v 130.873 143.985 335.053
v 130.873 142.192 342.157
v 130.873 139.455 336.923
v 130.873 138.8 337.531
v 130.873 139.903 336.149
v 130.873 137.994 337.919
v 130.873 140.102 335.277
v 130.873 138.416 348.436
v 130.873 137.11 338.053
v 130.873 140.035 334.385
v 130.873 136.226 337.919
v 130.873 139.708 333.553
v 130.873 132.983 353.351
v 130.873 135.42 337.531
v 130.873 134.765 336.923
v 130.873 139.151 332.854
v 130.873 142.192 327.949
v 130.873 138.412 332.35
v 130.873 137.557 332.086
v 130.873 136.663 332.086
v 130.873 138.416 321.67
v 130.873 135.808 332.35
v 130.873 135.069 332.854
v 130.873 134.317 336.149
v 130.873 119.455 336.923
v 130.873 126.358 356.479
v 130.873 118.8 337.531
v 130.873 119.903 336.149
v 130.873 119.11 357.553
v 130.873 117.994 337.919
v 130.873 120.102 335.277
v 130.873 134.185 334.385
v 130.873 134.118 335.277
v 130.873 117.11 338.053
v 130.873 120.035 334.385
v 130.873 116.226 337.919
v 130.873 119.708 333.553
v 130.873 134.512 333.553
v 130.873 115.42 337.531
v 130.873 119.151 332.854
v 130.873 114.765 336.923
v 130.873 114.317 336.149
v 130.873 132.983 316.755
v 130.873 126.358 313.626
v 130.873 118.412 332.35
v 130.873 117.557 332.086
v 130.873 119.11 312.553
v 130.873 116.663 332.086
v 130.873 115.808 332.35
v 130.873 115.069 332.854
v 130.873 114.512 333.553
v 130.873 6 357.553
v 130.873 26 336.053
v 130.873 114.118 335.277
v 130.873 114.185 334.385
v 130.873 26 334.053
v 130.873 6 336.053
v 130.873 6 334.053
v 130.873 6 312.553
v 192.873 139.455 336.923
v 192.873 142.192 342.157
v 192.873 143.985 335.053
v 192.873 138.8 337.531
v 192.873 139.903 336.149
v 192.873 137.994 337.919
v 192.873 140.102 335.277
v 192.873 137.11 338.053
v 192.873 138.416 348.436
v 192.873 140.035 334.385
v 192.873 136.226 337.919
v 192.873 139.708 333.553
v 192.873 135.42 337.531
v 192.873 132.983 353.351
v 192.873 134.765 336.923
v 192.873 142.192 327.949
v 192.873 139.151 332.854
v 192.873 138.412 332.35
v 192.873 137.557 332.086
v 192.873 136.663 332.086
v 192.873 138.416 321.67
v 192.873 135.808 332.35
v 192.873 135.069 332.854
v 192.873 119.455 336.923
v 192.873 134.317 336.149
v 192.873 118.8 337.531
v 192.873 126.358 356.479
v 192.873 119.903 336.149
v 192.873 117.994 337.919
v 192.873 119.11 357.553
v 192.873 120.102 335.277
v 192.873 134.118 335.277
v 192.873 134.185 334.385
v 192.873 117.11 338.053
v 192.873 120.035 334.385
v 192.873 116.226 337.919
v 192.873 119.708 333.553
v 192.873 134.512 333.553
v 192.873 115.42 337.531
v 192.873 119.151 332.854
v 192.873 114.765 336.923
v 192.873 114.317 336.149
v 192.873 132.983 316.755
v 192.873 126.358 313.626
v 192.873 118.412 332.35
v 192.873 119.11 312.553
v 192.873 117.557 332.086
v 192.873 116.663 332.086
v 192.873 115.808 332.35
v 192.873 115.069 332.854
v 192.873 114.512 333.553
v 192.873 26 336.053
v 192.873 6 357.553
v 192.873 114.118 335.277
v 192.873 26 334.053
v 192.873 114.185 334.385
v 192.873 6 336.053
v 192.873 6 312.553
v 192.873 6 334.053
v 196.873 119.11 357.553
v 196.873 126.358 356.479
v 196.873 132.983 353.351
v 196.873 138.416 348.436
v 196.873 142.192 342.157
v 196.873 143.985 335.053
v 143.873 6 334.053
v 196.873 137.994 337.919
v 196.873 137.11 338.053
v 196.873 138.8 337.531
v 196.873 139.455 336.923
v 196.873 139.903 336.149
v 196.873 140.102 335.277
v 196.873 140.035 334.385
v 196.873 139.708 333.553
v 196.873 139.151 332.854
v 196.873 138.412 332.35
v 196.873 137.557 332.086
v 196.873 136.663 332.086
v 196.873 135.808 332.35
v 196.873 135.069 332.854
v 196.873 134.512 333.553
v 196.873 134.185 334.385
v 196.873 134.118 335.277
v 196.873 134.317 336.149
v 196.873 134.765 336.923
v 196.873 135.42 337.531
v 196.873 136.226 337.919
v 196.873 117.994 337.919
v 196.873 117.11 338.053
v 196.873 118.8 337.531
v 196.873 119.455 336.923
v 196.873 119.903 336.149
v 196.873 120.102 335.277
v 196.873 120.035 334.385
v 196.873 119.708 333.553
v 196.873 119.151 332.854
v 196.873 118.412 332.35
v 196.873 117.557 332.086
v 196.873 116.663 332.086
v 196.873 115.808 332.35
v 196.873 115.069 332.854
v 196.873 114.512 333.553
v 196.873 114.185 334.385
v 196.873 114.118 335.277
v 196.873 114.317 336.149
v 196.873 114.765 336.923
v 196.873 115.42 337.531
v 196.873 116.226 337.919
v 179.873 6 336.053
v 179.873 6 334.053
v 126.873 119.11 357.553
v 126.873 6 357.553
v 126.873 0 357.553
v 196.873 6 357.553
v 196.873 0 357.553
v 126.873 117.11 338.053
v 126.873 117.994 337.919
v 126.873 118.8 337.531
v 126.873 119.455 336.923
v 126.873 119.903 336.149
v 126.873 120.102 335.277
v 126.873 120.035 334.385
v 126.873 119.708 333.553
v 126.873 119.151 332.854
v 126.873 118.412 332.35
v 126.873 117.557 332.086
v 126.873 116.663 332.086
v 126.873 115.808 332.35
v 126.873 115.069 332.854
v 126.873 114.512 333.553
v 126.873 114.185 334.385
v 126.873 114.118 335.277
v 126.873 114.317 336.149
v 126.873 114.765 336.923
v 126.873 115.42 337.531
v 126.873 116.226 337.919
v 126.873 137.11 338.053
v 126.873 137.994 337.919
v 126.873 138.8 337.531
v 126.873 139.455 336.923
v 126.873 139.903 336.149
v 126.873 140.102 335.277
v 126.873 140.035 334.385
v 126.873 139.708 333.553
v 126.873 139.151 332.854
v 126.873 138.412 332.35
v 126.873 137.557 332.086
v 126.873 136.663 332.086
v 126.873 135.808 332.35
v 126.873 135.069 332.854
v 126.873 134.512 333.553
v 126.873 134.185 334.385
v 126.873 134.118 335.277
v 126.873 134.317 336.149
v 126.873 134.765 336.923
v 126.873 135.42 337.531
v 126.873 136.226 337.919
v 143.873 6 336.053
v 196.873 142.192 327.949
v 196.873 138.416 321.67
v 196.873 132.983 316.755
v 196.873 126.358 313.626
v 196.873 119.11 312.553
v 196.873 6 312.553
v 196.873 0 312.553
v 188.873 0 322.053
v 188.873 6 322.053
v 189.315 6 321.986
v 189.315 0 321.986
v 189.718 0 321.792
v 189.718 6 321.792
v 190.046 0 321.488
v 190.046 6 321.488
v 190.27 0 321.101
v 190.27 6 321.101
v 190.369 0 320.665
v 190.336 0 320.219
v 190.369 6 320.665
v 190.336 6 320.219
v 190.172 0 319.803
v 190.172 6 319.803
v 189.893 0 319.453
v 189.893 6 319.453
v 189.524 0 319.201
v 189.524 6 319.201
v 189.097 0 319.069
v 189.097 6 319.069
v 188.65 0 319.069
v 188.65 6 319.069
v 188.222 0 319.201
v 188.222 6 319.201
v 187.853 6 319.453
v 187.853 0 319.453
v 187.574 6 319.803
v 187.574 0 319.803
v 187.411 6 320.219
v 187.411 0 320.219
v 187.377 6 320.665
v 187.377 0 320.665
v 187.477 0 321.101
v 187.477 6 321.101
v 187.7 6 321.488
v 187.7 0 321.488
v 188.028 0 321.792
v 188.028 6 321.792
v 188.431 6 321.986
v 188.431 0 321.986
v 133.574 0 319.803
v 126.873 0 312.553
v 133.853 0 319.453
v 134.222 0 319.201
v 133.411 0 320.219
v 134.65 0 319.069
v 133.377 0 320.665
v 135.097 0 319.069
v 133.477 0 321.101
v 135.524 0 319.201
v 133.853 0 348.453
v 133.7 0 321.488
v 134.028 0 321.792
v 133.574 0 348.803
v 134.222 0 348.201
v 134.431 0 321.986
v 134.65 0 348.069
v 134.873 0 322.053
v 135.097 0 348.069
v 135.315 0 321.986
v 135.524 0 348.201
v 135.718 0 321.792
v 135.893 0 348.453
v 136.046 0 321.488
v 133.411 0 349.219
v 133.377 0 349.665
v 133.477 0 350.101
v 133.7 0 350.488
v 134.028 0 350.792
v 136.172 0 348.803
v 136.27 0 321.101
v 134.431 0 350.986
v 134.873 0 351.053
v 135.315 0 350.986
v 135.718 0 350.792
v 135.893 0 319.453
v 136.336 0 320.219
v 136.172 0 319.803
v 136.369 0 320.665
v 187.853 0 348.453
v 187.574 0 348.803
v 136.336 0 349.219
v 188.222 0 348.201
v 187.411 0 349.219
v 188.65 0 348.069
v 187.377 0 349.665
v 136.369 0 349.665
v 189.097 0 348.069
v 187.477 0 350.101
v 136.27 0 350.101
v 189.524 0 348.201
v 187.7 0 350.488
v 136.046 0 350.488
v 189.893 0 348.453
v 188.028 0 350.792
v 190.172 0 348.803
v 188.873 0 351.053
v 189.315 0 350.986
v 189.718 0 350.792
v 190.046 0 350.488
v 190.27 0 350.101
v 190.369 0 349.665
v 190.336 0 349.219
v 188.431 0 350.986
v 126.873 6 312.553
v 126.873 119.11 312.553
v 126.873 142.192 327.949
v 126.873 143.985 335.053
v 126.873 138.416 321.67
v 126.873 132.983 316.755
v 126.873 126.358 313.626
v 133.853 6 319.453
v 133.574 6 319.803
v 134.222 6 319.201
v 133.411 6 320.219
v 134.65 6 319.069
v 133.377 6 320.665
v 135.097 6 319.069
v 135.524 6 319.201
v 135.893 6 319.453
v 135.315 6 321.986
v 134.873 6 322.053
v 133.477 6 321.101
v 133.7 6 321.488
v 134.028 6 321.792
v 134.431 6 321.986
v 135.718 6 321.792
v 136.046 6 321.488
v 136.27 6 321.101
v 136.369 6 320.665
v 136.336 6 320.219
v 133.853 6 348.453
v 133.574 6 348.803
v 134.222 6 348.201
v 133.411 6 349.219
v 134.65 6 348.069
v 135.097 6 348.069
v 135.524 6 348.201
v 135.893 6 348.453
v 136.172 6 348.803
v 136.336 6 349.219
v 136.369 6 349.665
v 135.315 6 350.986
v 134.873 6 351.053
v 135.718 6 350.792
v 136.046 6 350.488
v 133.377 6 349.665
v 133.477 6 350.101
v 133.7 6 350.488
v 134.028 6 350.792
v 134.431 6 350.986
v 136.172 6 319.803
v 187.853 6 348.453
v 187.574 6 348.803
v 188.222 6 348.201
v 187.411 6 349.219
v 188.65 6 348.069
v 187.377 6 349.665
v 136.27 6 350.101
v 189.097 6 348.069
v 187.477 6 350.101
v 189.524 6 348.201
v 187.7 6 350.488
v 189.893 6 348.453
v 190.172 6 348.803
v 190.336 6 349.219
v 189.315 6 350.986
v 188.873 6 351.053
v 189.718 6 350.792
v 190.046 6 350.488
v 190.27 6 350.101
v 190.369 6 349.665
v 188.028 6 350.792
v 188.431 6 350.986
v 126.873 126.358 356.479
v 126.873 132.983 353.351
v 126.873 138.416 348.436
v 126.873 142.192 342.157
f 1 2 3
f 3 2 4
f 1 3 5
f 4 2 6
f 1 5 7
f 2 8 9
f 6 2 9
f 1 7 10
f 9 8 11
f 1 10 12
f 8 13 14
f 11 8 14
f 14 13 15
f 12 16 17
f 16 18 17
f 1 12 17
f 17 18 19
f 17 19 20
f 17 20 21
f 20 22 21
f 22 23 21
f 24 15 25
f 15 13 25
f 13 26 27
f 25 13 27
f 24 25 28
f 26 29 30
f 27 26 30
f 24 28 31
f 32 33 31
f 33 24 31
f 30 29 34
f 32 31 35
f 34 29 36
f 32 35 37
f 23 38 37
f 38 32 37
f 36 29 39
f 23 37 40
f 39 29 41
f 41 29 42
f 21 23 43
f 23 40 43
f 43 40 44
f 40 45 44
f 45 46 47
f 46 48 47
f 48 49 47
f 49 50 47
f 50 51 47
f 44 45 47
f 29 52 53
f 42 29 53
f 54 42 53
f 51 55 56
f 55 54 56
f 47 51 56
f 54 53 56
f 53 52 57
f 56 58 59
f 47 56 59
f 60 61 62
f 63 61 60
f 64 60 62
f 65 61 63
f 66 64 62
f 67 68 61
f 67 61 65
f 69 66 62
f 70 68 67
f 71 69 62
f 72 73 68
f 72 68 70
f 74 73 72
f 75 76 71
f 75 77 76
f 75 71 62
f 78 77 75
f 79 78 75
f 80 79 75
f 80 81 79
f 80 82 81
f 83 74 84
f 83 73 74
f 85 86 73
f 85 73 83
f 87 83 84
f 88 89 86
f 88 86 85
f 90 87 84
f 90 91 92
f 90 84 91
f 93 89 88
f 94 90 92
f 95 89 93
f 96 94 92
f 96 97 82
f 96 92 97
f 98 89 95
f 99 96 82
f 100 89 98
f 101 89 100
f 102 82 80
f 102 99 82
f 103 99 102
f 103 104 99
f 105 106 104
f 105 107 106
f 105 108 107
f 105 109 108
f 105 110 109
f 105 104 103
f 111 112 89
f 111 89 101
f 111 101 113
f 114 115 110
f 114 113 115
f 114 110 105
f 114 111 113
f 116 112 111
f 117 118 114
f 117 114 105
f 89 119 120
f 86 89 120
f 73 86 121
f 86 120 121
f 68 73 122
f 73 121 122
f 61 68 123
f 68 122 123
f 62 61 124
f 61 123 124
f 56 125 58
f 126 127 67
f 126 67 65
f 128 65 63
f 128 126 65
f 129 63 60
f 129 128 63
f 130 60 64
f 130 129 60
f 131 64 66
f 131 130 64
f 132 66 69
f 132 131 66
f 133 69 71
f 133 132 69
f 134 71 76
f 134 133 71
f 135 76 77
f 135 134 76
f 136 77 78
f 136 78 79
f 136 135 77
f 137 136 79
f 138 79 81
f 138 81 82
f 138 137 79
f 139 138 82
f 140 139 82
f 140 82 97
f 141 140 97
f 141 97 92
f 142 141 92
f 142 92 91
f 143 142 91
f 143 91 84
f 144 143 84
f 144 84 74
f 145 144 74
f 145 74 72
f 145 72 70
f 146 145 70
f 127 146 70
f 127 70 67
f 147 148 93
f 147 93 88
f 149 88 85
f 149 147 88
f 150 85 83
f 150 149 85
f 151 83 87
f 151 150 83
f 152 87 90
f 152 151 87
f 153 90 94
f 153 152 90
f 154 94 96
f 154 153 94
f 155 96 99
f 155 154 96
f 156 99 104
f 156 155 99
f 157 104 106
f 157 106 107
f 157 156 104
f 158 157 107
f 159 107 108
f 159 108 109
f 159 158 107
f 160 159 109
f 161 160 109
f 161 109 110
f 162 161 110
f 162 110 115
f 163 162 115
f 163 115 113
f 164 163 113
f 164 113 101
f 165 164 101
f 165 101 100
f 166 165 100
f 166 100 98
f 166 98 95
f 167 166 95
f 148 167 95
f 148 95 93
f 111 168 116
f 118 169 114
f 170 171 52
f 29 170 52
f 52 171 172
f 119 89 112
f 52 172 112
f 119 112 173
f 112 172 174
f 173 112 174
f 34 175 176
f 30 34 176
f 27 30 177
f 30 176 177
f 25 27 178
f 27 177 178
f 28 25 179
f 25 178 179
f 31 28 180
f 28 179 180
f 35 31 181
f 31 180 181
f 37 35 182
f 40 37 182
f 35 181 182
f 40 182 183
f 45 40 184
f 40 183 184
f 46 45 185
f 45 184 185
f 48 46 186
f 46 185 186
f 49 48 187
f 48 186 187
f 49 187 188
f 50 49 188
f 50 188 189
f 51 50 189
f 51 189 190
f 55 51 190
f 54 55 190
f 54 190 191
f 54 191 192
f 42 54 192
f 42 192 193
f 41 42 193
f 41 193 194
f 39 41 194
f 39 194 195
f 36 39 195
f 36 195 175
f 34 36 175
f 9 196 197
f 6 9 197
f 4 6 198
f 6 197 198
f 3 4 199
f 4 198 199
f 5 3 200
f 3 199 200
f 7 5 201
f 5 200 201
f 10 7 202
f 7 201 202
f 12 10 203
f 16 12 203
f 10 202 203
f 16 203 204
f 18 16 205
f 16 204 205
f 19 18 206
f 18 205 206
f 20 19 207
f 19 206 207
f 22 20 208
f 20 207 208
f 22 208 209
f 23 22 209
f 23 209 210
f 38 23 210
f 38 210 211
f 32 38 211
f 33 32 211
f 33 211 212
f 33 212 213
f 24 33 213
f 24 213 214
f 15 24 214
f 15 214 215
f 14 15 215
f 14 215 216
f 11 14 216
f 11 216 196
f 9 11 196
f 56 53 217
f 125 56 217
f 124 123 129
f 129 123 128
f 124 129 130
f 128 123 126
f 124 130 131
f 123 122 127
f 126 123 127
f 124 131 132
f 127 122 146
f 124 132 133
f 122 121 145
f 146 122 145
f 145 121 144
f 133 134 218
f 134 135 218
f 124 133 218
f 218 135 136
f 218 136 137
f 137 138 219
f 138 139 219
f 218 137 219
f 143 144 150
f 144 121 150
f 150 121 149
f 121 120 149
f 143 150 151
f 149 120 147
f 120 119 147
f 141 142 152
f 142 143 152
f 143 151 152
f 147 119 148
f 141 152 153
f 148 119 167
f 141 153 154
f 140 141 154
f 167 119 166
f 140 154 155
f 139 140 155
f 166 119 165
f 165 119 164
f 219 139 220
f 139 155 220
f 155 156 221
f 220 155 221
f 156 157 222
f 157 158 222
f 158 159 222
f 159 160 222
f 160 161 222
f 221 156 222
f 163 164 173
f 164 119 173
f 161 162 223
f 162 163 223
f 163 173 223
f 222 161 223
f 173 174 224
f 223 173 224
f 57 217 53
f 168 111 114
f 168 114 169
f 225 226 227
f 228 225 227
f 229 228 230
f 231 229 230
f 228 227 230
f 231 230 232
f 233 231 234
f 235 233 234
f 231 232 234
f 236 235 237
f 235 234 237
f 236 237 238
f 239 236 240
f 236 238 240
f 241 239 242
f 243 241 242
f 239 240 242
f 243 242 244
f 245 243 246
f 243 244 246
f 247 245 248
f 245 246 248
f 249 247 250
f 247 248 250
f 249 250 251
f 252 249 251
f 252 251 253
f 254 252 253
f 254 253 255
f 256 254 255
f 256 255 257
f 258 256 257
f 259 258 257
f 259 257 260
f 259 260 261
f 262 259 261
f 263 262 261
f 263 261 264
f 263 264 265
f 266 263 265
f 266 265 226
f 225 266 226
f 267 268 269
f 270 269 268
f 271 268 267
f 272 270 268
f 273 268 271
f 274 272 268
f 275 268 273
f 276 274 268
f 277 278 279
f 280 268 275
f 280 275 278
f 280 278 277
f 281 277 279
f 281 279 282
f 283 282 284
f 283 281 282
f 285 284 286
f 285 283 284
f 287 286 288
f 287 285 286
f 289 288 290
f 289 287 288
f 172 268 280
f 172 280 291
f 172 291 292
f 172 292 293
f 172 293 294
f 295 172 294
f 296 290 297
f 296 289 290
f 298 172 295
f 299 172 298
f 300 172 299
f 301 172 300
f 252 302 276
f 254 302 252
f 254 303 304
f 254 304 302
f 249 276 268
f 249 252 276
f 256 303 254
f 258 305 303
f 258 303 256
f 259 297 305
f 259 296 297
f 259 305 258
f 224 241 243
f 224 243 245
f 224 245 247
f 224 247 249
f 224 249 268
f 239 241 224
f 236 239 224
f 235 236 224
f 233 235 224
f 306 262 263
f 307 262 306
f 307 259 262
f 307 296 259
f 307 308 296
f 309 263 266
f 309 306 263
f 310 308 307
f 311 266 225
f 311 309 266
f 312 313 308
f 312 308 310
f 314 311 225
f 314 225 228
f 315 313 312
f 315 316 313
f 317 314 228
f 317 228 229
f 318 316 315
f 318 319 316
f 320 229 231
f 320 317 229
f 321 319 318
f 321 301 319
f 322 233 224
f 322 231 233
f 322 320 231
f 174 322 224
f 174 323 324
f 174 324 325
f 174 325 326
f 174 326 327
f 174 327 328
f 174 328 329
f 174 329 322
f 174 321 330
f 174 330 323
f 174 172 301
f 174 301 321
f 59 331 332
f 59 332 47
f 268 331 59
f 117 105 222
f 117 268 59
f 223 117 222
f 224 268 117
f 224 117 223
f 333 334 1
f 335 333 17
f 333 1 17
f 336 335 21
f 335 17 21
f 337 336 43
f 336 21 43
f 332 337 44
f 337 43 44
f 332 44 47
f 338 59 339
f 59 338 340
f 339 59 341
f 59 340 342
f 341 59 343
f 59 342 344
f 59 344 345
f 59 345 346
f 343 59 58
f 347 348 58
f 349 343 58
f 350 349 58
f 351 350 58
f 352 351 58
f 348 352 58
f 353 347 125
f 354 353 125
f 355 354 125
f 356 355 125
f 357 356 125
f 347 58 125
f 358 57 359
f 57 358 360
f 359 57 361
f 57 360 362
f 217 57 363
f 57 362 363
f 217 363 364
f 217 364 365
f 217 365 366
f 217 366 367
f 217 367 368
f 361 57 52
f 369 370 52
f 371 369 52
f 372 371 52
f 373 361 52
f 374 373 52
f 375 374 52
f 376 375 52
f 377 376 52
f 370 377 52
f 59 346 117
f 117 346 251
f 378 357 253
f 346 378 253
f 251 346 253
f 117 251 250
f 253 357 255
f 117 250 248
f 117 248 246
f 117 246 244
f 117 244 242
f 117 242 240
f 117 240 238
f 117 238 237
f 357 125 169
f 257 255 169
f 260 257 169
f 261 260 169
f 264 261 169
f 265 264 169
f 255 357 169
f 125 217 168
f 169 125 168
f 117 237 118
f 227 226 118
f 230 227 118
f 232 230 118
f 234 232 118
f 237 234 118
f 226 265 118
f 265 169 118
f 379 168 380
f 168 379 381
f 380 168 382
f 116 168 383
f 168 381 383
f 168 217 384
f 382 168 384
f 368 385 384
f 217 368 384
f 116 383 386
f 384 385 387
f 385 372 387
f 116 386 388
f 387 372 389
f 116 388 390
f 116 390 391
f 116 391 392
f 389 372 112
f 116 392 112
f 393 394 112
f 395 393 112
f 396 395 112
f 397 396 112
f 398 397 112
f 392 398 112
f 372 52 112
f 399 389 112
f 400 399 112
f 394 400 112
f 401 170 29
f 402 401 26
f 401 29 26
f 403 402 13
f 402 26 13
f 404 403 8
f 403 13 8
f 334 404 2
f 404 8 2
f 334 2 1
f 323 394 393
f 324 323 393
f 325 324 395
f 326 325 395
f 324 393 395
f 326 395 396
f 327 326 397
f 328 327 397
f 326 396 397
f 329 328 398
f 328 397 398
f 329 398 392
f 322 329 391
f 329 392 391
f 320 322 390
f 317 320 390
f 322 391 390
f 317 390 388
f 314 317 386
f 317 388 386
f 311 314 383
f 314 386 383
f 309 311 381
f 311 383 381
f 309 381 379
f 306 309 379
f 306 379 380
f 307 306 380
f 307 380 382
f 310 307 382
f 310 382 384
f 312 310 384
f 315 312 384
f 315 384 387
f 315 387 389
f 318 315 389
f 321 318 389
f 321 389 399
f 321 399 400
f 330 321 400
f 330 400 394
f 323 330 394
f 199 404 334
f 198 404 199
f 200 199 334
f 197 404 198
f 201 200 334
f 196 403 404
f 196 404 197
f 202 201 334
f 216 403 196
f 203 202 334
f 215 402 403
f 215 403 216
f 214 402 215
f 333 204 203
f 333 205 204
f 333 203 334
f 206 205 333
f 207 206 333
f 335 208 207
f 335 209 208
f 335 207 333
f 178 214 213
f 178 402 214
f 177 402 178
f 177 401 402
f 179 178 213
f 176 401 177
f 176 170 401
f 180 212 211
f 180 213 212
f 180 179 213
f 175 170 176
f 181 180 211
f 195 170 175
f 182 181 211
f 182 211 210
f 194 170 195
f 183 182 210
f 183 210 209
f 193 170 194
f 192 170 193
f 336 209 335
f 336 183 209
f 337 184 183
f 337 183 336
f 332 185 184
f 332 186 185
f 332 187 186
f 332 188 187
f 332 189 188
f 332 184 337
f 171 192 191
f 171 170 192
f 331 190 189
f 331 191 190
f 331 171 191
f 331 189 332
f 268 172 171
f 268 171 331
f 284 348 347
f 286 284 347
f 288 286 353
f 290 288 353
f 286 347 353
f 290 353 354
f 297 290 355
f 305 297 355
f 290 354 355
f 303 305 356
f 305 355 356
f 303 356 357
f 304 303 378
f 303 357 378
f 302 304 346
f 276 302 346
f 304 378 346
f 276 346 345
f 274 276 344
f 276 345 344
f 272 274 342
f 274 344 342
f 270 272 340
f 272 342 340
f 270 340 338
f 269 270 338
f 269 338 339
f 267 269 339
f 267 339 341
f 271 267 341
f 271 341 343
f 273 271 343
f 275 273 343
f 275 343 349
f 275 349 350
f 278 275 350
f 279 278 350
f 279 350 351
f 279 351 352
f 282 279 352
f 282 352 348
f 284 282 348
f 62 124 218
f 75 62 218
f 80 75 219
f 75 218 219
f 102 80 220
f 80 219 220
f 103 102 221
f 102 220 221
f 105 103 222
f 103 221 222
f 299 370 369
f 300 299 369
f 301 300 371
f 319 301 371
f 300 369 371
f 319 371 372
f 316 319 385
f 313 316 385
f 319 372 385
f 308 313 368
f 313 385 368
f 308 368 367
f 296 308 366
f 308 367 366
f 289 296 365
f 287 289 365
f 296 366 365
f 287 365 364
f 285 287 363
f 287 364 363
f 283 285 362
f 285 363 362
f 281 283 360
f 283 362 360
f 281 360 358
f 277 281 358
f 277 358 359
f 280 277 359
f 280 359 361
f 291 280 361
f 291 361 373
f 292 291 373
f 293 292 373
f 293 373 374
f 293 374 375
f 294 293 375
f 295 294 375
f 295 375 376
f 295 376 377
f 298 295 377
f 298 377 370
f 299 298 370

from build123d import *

# Parameters (mm, degrees)
SKETCH1_W                = 70
SKETCH1_H                = 45
BOSS_EXTRUDE1_DEPTH      = 6
CUT_EXTRUDE1_REACH       = 410.214
SKETCH4_R                = 1.5
SKETCH5_W                = 4
SKETCH5_H                = 45
BOSS_EXTRUDE2_DEPTH      = 138.11
CUT_EXTRUDE2_REACH       = 393.806
SKETCH6_R                = 3
FILLET1_R                = 25
BOSS_EXTRUDE3_DEPTH      = 1
BOSS_EXTRUDE3_DEPTH_BACK = 1


with BuildPart() as part:
    # Sketch1 → Boss-Extrude1 (new body)
    with BuildSketch(Plane(origin=(148.74203414, 0, 254.057769676), x_dir=(1, 0, 0), z_dir=(0, -1, 0))):
        with Locations((13.131189711, 80.994934751)):
            Rectangle(SKETCH1_W, SKETCH1_H)
    extrude(amount=-BOSS_EXTRUDE1_DEPTH)

    # Sketch4 → Cut-Extrude1 (cut, up to next)
    with BuildSketch(Plane(origin=(0, 6, 0), x_dir=(-1, 0, 0), z_dir=(0, 1, 0)), mode=Mode.PRIVATE) as cut_extrude1_sk1:
        with Locations(Location((-188.87322385, 320.552704426, 0), (0, 0, 90))):
            Circle(SKETCH4_R)
    cut_extrude1_tool1 = extrude(cut_extrude1_sk1.sketch, amount=-CUT_EXTRUDE1_REACH, mode=Mode.PRIVATE) & part.part
    # Sketch4 → Cut-Extrude1 (cut, up to next)
    with BuildSketch(Plane(origin=(0, 6, 0), x_dir=(-1, 0, 0), z_dir=(0, 1, 0)), mode=Mode.PRIVATE) as cut_extrude1_sk2:
        with Locations(Location((-188.87322385, 349.552704426, 0), (0, 0, 90))):
            Circle(SKETCH4_R)
    cut_extrude1_tool2 = extrude(cut_extrude1_sk2.sketch, amount=-CUT_EXTRUDE1_REACH, mode=Mode.PRIVATE) & part.part
    # Sketch4 → Cut-Extrude1 (cut, up to next)
    with BuildSketch(Plane(origin=(0, 6, 0), x_dir=(-1, 0, 0), z_dir=(0, 1, 0)), mode=Mode.PRIVATE) as cut_extrude1_sk3:
        with Locations(Location((-134.87322385, 320.552704426, 0), (0, 0, 90))):
            Circle(SKETCH4_R)
    cut_extrude1_tool3 = extrude(cut_extrude1_sk3.sketch, amount=-CUT_EXTRUDE1_REACH, mode=Mode.PRIVATE) & part.part
    # Sketch4 → Cut-Extrude1 (cut, up to next)
    with BuildSketch(Plane(origin=(0, 6, 0), x_dir=(-1, 0, 0), z_dir=(0, 1, 0)), mode=Mode.PRIVATE) as cut_extrude1_sk4:
        with Locations(Location((-134.87322385, 349.552704426, 0), (0, 0, 90))):
            Circle(SKETCH4_R)
    cut_extrude1_tool4 = extrude(cut_extrude1_sk4.sketch, amount=-CUT_EXTRUDE1_REACH, mode=Mode.PRIVATE) & part.part
    add(cut_extrude1_tool1.solids().sort_by_distance((188.873224, 6, 320.552704))[0], mode=Mode.SUBTRACT)
    add(cut_extrude1_tool2.solids().sort_by_distance((188.873224, 6, 349.552704))[0], mode=Mode.SUBTRACT)
    add(cut_extrude1_tool3.solids().sort_by_distance((134.873224, 6, 320.552704))[0], mode=Mode.SUBTRACT)
    add(cut_extrude1_tool4.solids().sort_by_distance((134.873224, 6, 349.552704))[0], mode=Mode.SUBTRACT)

    # Sketch5 → Boss-Extrude2 (add)
    with BuildSketch(Plane(origin=(0, 6, 0), x_dir=(-1, 0, 0), z_dir=(0, -1, 0))):
        with Locations((-128.87322385, -335.052704426)):
            Rectangle(SKETCH5_W, SKETCH5_H)
    boss_extrude2 = extrude(amount=-BOSS_EXTRUDE2_DEPTH)

    # Sketch6 → Cut-Extrude2 (cut, up to next)
    with BuildSketch(Plane.ZY.offset(-126.87322385), mode=Mode.PRIVATE) as cut_extrude2_sk1:
        with Locations((335.052704426, 137.11)):
            Circle(SKETCH6_R)
    cut_extrude2_tool1 = extrude(cut_extrude2_sk1.sketch, amount=-CUT_EXTRUDE2_REACH, mode=Mode.PRIVATE) & part.part
    # Sketch6 → Cut-Extrude2 (cut, up to next)
    with BuildSketch(Plane.ZY.offset(-126.87322385), mode=Mode.PRIVATE) as cut_extrude2_sk2:
        with Locations((335.052704426, 117.11)):
            Circle(SKETCH6_R)
    cut_extrude2_tool2 = extrude(cut_extrude2_sk2.sketch, amount=-CUT_EXTRUDE2_REACH, mode=Mode.PRIVATE) & part.part
    cut_extrude2_1 = cut_extrude2_tool1.solids().sort_by_distance((126.873224, 137.11, 335.052704))[0]
    add(cut_extrude2_1, mode=Mode.SUBTRACT)
    cut_extrude2_2 = cut_extrude2_tool2.solids().sort_by_distance((126.873224, 117.11, 335.052704))[0]
    add(cut_extrude2_2, mode=Mode.SUBTRACT)
    cut_extrude2 = cut_extrude2_1 + cut_extrude2_2  # Cut-Extrude2 as one shape, for the pattern or mirror that repeats it

    # Mirror1: Boss-Extrude2, Cut-Extrude2 across plane
    add(boss_extrude2.mirror(Plane(origin=(161.87322385, 0, 0), x_dir=(0, 0, 1), z_dir=(1, 0, 0))))
    add(cut_extrude2.mirror(Plane(origin=(161.87322385, 0, 0), x_dir=(0, 0, 1), z_dir=(1, 0, 0))), mode=Mode.SUBTRACT)

    # Fillet1
    # the kernel refuses this fillet: 25 mm, written as the material it takes off along each edge
    with BuildSketch(Plane(origin=(259.37322385, 144.11, 312.552704426), x_dir=(0, 0, 1), z_dir=(-1, 0, 0)), Plane(origin=(193.37322385, 144.11, 357.552704426), x_dir=(0, -1, 0), z_dir=(-1, 0, 0))) as fillet1_piece_1:
        with BuildLine():
            CenterArc((FILLET1_R, -FILLET1_R), FILLET1_R, 90, 90)
            Line((0, -FILLET1_R), (0, 0))
            Line((0, 0), (FILLET1_R, 0))
        make_face()
    extrude(amount=129, mode=Mode.SUBTRACT)
    with BuildSketch(Plane(origin=(130.37322385, 144.11, 357.552704426), x_dir=(0, -1, 0), z_dir=(1, 0, 0)), Plane(origin=(64.37322385, 144.11, 312.552704426), x_dir=(0, 0, 1), z_dir=(1, 0, 0))) as fillet1_piece_2:
        with BuildLine():
            CenterArc((FILLET1_R, FILLET1_R), FILLET1_R, 180, 90)
            Line((0, FILLET1_R), (0, 0))
            Line((0, 0), (FILLET1_R, 0))
        make_face()
    extrude(amount=129, mode=Mode.SUBTRACT)

    # Sketch8 → Boss-Extrude3 (add, two sides: drawn at the far end of the back side and taken through both)
    with BuildSketch(Plane(origin=(0, 0, 335.052704426), x_dir=(-1, 0, 0), z_dir=(0, 0, -1)).offset(-BOSS_EXTRUDE3_DEPTH_BACK)):
        Polygon((-192.87322385, 6), (-192.87322385, 26), (-179.87322385, 6), align=None)
        Polygon((-130.87322385, 26), (-143.87322385, 6), (-130.87322385, 6), align=None)
    extrude(amount=BOSS_EXTRUDE3_DEPTH + BOSS_EXTRUDE3_DEPTH_BACK)


solid = part.part
